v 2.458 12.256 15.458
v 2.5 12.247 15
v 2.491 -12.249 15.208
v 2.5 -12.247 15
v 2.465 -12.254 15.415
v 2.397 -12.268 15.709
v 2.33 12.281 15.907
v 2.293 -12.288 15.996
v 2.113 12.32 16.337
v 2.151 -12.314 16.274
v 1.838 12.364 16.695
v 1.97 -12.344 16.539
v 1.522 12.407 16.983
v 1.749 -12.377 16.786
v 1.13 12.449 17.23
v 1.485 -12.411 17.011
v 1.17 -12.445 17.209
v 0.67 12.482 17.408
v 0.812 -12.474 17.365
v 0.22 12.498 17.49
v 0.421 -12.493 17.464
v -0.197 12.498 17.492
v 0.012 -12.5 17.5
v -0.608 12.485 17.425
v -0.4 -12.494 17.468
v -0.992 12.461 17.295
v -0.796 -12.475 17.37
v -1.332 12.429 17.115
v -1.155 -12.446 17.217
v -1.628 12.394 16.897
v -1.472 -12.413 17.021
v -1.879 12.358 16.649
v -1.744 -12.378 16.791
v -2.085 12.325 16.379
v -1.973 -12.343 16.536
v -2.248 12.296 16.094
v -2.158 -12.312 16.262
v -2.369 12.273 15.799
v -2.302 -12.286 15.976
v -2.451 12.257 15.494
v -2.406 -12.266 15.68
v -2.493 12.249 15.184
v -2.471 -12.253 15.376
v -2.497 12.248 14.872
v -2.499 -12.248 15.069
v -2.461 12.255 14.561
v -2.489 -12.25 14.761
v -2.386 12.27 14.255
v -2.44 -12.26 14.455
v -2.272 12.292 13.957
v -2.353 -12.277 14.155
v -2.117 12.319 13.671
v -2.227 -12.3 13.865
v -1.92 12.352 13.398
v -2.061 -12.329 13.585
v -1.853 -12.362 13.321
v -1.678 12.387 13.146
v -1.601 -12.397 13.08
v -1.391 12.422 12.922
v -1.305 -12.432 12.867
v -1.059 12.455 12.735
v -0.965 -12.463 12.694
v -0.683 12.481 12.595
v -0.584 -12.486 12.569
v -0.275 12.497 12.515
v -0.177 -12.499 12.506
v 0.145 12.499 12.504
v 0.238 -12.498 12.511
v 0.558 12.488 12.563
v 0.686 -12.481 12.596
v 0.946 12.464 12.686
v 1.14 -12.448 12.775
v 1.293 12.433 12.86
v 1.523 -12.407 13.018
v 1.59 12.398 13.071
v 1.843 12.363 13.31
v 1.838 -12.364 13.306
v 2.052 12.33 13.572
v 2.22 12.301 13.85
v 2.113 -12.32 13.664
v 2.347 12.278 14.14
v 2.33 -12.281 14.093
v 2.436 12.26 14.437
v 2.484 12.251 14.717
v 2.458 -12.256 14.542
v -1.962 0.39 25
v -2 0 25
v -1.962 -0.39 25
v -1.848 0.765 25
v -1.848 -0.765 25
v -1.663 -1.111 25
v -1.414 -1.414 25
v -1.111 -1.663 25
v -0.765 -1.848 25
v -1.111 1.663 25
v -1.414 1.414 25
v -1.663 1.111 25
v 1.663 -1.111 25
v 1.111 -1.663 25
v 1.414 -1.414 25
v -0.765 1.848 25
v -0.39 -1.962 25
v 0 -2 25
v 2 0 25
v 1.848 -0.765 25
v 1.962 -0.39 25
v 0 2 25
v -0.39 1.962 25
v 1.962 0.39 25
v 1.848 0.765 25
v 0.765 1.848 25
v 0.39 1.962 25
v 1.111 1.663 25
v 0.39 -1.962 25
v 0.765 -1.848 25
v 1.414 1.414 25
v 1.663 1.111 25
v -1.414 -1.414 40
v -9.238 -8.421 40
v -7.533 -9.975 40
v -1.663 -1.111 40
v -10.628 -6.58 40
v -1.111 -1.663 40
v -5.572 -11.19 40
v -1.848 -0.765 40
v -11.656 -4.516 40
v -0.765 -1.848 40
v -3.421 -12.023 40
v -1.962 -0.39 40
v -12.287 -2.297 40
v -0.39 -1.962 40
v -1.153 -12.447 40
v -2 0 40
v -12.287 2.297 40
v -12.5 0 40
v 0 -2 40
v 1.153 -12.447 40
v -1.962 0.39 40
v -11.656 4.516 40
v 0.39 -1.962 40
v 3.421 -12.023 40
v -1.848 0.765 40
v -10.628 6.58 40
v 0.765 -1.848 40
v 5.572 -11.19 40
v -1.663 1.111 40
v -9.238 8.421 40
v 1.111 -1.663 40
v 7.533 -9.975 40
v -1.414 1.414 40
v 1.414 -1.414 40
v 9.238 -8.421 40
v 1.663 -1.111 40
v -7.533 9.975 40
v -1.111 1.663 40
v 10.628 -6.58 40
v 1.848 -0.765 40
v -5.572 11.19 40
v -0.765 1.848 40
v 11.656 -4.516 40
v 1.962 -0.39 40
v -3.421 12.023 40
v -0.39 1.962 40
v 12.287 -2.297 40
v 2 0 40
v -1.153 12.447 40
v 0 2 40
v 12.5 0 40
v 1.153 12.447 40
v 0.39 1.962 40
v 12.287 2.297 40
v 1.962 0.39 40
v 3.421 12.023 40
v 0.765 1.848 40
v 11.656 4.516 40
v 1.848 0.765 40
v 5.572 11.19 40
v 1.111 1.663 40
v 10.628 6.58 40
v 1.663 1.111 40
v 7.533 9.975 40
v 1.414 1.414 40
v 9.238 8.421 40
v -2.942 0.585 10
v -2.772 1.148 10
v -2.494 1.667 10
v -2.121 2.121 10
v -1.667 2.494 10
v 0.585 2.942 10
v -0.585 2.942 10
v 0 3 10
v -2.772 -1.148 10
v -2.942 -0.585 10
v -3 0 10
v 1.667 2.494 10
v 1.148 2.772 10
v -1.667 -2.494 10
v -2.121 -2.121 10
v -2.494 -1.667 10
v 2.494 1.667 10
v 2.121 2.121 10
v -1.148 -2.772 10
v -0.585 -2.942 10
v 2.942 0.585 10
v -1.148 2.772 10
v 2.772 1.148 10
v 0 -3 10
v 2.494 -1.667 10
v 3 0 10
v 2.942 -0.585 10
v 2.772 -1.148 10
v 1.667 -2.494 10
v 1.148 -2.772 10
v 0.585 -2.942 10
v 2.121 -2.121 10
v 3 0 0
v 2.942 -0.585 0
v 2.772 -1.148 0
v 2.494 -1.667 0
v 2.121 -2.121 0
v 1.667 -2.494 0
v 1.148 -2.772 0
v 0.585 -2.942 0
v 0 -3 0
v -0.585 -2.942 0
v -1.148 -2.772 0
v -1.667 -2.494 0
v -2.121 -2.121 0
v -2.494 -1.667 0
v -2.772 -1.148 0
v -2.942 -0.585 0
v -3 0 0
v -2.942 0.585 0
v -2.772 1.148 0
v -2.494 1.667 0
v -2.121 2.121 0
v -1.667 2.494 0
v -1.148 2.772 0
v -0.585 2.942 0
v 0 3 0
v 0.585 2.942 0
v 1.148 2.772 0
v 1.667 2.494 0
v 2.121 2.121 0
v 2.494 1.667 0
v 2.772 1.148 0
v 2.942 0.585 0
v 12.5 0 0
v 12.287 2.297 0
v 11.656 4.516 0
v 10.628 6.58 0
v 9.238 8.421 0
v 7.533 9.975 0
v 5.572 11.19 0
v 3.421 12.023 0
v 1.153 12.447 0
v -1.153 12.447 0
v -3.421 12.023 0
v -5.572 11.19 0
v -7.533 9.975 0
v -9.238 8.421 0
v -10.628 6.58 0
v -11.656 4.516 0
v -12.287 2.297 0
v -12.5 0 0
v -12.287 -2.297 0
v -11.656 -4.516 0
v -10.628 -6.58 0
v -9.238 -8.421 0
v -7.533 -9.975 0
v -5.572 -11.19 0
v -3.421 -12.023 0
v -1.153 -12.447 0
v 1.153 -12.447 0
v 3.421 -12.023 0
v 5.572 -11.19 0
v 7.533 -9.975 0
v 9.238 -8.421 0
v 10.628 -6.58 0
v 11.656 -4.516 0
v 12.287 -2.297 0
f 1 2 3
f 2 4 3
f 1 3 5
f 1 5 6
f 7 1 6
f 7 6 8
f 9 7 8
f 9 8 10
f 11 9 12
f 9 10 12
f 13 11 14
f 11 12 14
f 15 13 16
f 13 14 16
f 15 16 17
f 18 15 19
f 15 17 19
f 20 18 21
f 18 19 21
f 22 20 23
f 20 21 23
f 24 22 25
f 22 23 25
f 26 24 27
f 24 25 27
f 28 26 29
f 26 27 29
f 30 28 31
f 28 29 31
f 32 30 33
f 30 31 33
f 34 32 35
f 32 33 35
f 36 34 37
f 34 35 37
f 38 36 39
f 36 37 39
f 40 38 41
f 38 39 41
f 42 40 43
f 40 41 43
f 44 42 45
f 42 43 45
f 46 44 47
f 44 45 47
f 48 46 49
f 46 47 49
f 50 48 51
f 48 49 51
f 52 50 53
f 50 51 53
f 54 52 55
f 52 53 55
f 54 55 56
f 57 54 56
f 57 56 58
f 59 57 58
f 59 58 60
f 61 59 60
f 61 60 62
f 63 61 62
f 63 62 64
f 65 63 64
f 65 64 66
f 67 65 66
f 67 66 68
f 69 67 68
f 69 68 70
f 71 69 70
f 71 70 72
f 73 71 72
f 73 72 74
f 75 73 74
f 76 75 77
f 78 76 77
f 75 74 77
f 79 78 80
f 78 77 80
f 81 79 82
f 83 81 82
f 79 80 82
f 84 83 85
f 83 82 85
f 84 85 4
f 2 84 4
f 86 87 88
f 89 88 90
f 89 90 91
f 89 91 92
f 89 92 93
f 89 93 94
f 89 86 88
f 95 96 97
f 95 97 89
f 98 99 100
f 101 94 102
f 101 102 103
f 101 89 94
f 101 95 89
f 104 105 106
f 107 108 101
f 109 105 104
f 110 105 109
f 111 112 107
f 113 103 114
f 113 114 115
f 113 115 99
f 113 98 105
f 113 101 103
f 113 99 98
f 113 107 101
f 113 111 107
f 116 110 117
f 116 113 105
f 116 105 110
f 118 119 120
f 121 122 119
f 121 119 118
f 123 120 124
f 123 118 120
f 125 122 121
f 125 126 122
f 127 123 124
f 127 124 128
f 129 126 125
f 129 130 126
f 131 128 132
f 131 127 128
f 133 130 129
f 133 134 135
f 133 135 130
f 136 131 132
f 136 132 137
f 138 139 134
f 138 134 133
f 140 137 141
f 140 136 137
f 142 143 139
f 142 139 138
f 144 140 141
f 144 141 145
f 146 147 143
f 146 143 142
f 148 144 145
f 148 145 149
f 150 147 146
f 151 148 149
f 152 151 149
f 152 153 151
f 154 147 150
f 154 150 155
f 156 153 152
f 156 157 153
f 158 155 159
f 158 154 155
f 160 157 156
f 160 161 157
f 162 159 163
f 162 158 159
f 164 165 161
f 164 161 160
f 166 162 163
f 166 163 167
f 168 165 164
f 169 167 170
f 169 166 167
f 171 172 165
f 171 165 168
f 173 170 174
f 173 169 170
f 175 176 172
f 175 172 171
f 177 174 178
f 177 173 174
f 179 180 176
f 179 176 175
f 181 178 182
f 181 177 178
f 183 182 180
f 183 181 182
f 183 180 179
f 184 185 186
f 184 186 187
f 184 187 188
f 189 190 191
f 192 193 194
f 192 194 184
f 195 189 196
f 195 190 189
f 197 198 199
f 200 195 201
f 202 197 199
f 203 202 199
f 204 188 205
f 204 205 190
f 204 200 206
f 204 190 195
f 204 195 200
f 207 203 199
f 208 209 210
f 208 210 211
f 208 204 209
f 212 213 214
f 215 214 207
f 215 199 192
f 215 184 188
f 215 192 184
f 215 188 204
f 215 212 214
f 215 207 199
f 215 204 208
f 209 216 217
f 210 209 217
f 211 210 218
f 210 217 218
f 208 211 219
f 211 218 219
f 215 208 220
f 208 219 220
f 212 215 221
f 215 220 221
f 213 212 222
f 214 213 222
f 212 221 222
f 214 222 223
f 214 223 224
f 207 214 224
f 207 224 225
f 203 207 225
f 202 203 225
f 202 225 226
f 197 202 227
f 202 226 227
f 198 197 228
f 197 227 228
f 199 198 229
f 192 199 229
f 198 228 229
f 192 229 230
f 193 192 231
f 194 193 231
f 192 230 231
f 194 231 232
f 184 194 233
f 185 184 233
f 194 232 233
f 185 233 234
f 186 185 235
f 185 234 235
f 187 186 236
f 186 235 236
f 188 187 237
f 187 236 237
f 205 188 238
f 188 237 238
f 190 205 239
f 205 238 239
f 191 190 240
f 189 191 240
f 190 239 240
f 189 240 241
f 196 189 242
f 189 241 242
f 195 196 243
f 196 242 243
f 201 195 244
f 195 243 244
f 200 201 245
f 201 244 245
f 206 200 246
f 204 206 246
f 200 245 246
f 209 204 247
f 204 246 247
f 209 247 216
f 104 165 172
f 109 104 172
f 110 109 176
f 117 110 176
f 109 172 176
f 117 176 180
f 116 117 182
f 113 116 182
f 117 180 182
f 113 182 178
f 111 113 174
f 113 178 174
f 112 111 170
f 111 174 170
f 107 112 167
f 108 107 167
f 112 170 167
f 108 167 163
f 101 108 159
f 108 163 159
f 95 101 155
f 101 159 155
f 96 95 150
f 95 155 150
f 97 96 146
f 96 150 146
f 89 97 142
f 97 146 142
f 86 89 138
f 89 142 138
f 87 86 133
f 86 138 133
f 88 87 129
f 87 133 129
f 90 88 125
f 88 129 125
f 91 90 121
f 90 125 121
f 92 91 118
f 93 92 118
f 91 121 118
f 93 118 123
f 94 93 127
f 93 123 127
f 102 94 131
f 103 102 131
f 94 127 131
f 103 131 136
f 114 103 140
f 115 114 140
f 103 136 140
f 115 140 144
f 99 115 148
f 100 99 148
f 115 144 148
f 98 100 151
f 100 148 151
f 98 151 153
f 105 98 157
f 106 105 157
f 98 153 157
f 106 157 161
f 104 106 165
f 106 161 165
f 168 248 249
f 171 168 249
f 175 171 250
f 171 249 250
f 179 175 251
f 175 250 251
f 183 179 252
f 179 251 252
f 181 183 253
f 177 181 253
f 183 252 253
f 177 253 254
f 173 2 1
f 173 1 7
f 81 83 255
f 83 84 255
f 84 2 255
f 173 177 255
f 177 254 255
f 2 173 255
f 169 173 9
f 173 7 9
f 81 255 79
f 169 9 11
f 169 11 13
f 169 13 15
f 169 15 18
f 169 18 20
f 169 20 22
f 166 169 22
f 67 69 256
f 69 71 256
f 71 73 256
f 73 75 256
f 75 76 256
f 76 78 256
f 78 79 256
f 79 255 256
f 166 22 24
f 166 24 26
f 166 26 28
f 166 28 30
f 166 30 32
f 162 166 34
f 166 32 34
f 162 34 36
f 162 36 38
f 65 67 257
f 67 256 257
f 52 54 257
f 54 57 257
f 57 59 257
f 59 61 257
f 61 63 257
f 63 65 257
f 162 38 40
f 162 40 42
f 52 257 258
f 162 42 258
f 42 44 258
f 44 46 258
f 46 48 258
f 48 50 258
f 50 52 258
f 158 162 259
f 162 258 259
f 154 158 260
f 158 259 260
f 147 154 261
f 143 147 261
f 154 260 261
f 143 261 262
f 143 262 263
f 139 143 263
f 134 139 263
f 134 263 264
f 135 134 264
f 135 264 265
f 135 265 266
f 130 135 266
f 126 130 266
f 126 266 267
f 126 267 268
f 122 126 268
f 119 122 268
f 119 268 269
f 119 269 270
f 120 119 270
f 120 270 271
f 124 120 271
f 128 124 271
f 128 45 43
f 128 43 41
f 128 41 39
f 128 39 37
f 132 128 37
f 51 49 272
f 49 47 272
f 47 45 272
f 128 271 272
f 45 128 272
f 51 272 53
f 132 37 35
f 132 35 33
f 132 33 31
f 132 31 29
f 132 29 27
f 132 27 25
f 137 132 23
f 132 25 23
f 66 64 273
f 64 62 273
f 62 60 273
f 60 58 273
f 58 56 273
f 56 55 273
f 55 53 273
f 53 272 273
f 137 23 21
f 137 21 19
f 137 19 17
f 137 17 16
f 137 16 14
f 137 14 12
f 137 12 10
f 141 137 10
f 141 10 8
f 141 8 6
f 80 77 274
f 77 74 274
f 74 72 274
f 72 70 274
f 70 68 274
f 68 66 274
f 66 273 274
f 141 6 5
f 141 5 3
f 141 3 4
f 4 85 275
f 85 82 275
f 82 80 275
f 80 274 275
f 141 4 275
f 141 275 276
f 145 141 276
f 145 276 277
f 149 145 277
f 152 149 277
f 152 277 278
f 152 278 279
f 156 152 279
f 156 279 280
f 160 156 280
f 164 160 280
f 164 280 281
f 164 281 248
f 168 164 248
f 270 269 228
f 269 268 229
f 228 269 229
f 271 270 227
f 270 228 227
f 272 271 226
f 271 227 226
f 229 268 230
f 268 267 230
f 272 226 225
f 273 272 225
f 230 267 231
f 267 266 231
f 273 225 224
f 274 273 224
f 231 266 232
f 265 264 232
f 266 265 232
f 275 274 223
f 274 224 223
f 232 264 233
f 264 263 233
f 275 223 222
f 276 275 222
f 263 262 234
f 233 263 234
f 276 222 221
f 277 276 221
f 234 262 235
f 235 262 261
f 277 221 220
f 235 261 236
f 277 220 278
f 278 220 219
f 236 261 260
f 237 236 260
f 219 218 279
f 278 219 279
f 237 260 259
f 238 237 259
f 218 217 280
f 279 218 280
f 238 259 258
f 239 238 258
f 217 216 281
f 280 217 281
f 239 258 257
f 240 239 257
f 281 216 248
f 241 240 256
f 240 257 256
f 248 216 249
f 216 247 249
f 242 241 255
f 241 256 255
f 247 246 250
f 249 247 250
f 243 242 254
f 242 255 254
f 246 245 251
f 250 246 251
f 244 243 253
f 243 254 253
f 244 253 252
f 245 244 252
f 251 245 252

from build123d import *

# Parameters (mm, degrees)
F0_R     = 12.5
F1_DEPTH = 40
F2_R     = 2
F3_DEPTH = 15
F4_R     = 3
F5_DEPTH = 10
F6_R     = 2.5
F7_DEPTH = 12.5


with BuildPart() as f1:
    # F0 (on Top) → F1 (new body)
    with BuildSketch(Plane.XY):
        Circle(F0_R)
    extrude(amount=F1_DEPTH)

    # F2 (on face) → F3 (cut)
    with BuildSketch(Plane.XY.offset(40)):
        Circle(F2_R)
    extrude(amount=-F3_DEPTH, mode=Mode.SUBTRACT)

    # F4 (on face) → F5 (cut)
    with BuildSketch(Plane(origin=(0, 0, 0), x_dir=(1, 0, 0), z_dir=(0, 0, -1))):
        Circle(F4_R)
    extrude(amount=-F5_DEPTH, mode=Mode.SUBTRACT)

    # F6 (on Front) → F7 (cut, symmetric)
    with BuildSketch(Plane.XZ):
        with Locations((0, 15)):
            Circle(F6_R)
    extrude(amount=F7_DEPTH, both=True, mode=Mode.SUBTRACT)


solid = f1.part
